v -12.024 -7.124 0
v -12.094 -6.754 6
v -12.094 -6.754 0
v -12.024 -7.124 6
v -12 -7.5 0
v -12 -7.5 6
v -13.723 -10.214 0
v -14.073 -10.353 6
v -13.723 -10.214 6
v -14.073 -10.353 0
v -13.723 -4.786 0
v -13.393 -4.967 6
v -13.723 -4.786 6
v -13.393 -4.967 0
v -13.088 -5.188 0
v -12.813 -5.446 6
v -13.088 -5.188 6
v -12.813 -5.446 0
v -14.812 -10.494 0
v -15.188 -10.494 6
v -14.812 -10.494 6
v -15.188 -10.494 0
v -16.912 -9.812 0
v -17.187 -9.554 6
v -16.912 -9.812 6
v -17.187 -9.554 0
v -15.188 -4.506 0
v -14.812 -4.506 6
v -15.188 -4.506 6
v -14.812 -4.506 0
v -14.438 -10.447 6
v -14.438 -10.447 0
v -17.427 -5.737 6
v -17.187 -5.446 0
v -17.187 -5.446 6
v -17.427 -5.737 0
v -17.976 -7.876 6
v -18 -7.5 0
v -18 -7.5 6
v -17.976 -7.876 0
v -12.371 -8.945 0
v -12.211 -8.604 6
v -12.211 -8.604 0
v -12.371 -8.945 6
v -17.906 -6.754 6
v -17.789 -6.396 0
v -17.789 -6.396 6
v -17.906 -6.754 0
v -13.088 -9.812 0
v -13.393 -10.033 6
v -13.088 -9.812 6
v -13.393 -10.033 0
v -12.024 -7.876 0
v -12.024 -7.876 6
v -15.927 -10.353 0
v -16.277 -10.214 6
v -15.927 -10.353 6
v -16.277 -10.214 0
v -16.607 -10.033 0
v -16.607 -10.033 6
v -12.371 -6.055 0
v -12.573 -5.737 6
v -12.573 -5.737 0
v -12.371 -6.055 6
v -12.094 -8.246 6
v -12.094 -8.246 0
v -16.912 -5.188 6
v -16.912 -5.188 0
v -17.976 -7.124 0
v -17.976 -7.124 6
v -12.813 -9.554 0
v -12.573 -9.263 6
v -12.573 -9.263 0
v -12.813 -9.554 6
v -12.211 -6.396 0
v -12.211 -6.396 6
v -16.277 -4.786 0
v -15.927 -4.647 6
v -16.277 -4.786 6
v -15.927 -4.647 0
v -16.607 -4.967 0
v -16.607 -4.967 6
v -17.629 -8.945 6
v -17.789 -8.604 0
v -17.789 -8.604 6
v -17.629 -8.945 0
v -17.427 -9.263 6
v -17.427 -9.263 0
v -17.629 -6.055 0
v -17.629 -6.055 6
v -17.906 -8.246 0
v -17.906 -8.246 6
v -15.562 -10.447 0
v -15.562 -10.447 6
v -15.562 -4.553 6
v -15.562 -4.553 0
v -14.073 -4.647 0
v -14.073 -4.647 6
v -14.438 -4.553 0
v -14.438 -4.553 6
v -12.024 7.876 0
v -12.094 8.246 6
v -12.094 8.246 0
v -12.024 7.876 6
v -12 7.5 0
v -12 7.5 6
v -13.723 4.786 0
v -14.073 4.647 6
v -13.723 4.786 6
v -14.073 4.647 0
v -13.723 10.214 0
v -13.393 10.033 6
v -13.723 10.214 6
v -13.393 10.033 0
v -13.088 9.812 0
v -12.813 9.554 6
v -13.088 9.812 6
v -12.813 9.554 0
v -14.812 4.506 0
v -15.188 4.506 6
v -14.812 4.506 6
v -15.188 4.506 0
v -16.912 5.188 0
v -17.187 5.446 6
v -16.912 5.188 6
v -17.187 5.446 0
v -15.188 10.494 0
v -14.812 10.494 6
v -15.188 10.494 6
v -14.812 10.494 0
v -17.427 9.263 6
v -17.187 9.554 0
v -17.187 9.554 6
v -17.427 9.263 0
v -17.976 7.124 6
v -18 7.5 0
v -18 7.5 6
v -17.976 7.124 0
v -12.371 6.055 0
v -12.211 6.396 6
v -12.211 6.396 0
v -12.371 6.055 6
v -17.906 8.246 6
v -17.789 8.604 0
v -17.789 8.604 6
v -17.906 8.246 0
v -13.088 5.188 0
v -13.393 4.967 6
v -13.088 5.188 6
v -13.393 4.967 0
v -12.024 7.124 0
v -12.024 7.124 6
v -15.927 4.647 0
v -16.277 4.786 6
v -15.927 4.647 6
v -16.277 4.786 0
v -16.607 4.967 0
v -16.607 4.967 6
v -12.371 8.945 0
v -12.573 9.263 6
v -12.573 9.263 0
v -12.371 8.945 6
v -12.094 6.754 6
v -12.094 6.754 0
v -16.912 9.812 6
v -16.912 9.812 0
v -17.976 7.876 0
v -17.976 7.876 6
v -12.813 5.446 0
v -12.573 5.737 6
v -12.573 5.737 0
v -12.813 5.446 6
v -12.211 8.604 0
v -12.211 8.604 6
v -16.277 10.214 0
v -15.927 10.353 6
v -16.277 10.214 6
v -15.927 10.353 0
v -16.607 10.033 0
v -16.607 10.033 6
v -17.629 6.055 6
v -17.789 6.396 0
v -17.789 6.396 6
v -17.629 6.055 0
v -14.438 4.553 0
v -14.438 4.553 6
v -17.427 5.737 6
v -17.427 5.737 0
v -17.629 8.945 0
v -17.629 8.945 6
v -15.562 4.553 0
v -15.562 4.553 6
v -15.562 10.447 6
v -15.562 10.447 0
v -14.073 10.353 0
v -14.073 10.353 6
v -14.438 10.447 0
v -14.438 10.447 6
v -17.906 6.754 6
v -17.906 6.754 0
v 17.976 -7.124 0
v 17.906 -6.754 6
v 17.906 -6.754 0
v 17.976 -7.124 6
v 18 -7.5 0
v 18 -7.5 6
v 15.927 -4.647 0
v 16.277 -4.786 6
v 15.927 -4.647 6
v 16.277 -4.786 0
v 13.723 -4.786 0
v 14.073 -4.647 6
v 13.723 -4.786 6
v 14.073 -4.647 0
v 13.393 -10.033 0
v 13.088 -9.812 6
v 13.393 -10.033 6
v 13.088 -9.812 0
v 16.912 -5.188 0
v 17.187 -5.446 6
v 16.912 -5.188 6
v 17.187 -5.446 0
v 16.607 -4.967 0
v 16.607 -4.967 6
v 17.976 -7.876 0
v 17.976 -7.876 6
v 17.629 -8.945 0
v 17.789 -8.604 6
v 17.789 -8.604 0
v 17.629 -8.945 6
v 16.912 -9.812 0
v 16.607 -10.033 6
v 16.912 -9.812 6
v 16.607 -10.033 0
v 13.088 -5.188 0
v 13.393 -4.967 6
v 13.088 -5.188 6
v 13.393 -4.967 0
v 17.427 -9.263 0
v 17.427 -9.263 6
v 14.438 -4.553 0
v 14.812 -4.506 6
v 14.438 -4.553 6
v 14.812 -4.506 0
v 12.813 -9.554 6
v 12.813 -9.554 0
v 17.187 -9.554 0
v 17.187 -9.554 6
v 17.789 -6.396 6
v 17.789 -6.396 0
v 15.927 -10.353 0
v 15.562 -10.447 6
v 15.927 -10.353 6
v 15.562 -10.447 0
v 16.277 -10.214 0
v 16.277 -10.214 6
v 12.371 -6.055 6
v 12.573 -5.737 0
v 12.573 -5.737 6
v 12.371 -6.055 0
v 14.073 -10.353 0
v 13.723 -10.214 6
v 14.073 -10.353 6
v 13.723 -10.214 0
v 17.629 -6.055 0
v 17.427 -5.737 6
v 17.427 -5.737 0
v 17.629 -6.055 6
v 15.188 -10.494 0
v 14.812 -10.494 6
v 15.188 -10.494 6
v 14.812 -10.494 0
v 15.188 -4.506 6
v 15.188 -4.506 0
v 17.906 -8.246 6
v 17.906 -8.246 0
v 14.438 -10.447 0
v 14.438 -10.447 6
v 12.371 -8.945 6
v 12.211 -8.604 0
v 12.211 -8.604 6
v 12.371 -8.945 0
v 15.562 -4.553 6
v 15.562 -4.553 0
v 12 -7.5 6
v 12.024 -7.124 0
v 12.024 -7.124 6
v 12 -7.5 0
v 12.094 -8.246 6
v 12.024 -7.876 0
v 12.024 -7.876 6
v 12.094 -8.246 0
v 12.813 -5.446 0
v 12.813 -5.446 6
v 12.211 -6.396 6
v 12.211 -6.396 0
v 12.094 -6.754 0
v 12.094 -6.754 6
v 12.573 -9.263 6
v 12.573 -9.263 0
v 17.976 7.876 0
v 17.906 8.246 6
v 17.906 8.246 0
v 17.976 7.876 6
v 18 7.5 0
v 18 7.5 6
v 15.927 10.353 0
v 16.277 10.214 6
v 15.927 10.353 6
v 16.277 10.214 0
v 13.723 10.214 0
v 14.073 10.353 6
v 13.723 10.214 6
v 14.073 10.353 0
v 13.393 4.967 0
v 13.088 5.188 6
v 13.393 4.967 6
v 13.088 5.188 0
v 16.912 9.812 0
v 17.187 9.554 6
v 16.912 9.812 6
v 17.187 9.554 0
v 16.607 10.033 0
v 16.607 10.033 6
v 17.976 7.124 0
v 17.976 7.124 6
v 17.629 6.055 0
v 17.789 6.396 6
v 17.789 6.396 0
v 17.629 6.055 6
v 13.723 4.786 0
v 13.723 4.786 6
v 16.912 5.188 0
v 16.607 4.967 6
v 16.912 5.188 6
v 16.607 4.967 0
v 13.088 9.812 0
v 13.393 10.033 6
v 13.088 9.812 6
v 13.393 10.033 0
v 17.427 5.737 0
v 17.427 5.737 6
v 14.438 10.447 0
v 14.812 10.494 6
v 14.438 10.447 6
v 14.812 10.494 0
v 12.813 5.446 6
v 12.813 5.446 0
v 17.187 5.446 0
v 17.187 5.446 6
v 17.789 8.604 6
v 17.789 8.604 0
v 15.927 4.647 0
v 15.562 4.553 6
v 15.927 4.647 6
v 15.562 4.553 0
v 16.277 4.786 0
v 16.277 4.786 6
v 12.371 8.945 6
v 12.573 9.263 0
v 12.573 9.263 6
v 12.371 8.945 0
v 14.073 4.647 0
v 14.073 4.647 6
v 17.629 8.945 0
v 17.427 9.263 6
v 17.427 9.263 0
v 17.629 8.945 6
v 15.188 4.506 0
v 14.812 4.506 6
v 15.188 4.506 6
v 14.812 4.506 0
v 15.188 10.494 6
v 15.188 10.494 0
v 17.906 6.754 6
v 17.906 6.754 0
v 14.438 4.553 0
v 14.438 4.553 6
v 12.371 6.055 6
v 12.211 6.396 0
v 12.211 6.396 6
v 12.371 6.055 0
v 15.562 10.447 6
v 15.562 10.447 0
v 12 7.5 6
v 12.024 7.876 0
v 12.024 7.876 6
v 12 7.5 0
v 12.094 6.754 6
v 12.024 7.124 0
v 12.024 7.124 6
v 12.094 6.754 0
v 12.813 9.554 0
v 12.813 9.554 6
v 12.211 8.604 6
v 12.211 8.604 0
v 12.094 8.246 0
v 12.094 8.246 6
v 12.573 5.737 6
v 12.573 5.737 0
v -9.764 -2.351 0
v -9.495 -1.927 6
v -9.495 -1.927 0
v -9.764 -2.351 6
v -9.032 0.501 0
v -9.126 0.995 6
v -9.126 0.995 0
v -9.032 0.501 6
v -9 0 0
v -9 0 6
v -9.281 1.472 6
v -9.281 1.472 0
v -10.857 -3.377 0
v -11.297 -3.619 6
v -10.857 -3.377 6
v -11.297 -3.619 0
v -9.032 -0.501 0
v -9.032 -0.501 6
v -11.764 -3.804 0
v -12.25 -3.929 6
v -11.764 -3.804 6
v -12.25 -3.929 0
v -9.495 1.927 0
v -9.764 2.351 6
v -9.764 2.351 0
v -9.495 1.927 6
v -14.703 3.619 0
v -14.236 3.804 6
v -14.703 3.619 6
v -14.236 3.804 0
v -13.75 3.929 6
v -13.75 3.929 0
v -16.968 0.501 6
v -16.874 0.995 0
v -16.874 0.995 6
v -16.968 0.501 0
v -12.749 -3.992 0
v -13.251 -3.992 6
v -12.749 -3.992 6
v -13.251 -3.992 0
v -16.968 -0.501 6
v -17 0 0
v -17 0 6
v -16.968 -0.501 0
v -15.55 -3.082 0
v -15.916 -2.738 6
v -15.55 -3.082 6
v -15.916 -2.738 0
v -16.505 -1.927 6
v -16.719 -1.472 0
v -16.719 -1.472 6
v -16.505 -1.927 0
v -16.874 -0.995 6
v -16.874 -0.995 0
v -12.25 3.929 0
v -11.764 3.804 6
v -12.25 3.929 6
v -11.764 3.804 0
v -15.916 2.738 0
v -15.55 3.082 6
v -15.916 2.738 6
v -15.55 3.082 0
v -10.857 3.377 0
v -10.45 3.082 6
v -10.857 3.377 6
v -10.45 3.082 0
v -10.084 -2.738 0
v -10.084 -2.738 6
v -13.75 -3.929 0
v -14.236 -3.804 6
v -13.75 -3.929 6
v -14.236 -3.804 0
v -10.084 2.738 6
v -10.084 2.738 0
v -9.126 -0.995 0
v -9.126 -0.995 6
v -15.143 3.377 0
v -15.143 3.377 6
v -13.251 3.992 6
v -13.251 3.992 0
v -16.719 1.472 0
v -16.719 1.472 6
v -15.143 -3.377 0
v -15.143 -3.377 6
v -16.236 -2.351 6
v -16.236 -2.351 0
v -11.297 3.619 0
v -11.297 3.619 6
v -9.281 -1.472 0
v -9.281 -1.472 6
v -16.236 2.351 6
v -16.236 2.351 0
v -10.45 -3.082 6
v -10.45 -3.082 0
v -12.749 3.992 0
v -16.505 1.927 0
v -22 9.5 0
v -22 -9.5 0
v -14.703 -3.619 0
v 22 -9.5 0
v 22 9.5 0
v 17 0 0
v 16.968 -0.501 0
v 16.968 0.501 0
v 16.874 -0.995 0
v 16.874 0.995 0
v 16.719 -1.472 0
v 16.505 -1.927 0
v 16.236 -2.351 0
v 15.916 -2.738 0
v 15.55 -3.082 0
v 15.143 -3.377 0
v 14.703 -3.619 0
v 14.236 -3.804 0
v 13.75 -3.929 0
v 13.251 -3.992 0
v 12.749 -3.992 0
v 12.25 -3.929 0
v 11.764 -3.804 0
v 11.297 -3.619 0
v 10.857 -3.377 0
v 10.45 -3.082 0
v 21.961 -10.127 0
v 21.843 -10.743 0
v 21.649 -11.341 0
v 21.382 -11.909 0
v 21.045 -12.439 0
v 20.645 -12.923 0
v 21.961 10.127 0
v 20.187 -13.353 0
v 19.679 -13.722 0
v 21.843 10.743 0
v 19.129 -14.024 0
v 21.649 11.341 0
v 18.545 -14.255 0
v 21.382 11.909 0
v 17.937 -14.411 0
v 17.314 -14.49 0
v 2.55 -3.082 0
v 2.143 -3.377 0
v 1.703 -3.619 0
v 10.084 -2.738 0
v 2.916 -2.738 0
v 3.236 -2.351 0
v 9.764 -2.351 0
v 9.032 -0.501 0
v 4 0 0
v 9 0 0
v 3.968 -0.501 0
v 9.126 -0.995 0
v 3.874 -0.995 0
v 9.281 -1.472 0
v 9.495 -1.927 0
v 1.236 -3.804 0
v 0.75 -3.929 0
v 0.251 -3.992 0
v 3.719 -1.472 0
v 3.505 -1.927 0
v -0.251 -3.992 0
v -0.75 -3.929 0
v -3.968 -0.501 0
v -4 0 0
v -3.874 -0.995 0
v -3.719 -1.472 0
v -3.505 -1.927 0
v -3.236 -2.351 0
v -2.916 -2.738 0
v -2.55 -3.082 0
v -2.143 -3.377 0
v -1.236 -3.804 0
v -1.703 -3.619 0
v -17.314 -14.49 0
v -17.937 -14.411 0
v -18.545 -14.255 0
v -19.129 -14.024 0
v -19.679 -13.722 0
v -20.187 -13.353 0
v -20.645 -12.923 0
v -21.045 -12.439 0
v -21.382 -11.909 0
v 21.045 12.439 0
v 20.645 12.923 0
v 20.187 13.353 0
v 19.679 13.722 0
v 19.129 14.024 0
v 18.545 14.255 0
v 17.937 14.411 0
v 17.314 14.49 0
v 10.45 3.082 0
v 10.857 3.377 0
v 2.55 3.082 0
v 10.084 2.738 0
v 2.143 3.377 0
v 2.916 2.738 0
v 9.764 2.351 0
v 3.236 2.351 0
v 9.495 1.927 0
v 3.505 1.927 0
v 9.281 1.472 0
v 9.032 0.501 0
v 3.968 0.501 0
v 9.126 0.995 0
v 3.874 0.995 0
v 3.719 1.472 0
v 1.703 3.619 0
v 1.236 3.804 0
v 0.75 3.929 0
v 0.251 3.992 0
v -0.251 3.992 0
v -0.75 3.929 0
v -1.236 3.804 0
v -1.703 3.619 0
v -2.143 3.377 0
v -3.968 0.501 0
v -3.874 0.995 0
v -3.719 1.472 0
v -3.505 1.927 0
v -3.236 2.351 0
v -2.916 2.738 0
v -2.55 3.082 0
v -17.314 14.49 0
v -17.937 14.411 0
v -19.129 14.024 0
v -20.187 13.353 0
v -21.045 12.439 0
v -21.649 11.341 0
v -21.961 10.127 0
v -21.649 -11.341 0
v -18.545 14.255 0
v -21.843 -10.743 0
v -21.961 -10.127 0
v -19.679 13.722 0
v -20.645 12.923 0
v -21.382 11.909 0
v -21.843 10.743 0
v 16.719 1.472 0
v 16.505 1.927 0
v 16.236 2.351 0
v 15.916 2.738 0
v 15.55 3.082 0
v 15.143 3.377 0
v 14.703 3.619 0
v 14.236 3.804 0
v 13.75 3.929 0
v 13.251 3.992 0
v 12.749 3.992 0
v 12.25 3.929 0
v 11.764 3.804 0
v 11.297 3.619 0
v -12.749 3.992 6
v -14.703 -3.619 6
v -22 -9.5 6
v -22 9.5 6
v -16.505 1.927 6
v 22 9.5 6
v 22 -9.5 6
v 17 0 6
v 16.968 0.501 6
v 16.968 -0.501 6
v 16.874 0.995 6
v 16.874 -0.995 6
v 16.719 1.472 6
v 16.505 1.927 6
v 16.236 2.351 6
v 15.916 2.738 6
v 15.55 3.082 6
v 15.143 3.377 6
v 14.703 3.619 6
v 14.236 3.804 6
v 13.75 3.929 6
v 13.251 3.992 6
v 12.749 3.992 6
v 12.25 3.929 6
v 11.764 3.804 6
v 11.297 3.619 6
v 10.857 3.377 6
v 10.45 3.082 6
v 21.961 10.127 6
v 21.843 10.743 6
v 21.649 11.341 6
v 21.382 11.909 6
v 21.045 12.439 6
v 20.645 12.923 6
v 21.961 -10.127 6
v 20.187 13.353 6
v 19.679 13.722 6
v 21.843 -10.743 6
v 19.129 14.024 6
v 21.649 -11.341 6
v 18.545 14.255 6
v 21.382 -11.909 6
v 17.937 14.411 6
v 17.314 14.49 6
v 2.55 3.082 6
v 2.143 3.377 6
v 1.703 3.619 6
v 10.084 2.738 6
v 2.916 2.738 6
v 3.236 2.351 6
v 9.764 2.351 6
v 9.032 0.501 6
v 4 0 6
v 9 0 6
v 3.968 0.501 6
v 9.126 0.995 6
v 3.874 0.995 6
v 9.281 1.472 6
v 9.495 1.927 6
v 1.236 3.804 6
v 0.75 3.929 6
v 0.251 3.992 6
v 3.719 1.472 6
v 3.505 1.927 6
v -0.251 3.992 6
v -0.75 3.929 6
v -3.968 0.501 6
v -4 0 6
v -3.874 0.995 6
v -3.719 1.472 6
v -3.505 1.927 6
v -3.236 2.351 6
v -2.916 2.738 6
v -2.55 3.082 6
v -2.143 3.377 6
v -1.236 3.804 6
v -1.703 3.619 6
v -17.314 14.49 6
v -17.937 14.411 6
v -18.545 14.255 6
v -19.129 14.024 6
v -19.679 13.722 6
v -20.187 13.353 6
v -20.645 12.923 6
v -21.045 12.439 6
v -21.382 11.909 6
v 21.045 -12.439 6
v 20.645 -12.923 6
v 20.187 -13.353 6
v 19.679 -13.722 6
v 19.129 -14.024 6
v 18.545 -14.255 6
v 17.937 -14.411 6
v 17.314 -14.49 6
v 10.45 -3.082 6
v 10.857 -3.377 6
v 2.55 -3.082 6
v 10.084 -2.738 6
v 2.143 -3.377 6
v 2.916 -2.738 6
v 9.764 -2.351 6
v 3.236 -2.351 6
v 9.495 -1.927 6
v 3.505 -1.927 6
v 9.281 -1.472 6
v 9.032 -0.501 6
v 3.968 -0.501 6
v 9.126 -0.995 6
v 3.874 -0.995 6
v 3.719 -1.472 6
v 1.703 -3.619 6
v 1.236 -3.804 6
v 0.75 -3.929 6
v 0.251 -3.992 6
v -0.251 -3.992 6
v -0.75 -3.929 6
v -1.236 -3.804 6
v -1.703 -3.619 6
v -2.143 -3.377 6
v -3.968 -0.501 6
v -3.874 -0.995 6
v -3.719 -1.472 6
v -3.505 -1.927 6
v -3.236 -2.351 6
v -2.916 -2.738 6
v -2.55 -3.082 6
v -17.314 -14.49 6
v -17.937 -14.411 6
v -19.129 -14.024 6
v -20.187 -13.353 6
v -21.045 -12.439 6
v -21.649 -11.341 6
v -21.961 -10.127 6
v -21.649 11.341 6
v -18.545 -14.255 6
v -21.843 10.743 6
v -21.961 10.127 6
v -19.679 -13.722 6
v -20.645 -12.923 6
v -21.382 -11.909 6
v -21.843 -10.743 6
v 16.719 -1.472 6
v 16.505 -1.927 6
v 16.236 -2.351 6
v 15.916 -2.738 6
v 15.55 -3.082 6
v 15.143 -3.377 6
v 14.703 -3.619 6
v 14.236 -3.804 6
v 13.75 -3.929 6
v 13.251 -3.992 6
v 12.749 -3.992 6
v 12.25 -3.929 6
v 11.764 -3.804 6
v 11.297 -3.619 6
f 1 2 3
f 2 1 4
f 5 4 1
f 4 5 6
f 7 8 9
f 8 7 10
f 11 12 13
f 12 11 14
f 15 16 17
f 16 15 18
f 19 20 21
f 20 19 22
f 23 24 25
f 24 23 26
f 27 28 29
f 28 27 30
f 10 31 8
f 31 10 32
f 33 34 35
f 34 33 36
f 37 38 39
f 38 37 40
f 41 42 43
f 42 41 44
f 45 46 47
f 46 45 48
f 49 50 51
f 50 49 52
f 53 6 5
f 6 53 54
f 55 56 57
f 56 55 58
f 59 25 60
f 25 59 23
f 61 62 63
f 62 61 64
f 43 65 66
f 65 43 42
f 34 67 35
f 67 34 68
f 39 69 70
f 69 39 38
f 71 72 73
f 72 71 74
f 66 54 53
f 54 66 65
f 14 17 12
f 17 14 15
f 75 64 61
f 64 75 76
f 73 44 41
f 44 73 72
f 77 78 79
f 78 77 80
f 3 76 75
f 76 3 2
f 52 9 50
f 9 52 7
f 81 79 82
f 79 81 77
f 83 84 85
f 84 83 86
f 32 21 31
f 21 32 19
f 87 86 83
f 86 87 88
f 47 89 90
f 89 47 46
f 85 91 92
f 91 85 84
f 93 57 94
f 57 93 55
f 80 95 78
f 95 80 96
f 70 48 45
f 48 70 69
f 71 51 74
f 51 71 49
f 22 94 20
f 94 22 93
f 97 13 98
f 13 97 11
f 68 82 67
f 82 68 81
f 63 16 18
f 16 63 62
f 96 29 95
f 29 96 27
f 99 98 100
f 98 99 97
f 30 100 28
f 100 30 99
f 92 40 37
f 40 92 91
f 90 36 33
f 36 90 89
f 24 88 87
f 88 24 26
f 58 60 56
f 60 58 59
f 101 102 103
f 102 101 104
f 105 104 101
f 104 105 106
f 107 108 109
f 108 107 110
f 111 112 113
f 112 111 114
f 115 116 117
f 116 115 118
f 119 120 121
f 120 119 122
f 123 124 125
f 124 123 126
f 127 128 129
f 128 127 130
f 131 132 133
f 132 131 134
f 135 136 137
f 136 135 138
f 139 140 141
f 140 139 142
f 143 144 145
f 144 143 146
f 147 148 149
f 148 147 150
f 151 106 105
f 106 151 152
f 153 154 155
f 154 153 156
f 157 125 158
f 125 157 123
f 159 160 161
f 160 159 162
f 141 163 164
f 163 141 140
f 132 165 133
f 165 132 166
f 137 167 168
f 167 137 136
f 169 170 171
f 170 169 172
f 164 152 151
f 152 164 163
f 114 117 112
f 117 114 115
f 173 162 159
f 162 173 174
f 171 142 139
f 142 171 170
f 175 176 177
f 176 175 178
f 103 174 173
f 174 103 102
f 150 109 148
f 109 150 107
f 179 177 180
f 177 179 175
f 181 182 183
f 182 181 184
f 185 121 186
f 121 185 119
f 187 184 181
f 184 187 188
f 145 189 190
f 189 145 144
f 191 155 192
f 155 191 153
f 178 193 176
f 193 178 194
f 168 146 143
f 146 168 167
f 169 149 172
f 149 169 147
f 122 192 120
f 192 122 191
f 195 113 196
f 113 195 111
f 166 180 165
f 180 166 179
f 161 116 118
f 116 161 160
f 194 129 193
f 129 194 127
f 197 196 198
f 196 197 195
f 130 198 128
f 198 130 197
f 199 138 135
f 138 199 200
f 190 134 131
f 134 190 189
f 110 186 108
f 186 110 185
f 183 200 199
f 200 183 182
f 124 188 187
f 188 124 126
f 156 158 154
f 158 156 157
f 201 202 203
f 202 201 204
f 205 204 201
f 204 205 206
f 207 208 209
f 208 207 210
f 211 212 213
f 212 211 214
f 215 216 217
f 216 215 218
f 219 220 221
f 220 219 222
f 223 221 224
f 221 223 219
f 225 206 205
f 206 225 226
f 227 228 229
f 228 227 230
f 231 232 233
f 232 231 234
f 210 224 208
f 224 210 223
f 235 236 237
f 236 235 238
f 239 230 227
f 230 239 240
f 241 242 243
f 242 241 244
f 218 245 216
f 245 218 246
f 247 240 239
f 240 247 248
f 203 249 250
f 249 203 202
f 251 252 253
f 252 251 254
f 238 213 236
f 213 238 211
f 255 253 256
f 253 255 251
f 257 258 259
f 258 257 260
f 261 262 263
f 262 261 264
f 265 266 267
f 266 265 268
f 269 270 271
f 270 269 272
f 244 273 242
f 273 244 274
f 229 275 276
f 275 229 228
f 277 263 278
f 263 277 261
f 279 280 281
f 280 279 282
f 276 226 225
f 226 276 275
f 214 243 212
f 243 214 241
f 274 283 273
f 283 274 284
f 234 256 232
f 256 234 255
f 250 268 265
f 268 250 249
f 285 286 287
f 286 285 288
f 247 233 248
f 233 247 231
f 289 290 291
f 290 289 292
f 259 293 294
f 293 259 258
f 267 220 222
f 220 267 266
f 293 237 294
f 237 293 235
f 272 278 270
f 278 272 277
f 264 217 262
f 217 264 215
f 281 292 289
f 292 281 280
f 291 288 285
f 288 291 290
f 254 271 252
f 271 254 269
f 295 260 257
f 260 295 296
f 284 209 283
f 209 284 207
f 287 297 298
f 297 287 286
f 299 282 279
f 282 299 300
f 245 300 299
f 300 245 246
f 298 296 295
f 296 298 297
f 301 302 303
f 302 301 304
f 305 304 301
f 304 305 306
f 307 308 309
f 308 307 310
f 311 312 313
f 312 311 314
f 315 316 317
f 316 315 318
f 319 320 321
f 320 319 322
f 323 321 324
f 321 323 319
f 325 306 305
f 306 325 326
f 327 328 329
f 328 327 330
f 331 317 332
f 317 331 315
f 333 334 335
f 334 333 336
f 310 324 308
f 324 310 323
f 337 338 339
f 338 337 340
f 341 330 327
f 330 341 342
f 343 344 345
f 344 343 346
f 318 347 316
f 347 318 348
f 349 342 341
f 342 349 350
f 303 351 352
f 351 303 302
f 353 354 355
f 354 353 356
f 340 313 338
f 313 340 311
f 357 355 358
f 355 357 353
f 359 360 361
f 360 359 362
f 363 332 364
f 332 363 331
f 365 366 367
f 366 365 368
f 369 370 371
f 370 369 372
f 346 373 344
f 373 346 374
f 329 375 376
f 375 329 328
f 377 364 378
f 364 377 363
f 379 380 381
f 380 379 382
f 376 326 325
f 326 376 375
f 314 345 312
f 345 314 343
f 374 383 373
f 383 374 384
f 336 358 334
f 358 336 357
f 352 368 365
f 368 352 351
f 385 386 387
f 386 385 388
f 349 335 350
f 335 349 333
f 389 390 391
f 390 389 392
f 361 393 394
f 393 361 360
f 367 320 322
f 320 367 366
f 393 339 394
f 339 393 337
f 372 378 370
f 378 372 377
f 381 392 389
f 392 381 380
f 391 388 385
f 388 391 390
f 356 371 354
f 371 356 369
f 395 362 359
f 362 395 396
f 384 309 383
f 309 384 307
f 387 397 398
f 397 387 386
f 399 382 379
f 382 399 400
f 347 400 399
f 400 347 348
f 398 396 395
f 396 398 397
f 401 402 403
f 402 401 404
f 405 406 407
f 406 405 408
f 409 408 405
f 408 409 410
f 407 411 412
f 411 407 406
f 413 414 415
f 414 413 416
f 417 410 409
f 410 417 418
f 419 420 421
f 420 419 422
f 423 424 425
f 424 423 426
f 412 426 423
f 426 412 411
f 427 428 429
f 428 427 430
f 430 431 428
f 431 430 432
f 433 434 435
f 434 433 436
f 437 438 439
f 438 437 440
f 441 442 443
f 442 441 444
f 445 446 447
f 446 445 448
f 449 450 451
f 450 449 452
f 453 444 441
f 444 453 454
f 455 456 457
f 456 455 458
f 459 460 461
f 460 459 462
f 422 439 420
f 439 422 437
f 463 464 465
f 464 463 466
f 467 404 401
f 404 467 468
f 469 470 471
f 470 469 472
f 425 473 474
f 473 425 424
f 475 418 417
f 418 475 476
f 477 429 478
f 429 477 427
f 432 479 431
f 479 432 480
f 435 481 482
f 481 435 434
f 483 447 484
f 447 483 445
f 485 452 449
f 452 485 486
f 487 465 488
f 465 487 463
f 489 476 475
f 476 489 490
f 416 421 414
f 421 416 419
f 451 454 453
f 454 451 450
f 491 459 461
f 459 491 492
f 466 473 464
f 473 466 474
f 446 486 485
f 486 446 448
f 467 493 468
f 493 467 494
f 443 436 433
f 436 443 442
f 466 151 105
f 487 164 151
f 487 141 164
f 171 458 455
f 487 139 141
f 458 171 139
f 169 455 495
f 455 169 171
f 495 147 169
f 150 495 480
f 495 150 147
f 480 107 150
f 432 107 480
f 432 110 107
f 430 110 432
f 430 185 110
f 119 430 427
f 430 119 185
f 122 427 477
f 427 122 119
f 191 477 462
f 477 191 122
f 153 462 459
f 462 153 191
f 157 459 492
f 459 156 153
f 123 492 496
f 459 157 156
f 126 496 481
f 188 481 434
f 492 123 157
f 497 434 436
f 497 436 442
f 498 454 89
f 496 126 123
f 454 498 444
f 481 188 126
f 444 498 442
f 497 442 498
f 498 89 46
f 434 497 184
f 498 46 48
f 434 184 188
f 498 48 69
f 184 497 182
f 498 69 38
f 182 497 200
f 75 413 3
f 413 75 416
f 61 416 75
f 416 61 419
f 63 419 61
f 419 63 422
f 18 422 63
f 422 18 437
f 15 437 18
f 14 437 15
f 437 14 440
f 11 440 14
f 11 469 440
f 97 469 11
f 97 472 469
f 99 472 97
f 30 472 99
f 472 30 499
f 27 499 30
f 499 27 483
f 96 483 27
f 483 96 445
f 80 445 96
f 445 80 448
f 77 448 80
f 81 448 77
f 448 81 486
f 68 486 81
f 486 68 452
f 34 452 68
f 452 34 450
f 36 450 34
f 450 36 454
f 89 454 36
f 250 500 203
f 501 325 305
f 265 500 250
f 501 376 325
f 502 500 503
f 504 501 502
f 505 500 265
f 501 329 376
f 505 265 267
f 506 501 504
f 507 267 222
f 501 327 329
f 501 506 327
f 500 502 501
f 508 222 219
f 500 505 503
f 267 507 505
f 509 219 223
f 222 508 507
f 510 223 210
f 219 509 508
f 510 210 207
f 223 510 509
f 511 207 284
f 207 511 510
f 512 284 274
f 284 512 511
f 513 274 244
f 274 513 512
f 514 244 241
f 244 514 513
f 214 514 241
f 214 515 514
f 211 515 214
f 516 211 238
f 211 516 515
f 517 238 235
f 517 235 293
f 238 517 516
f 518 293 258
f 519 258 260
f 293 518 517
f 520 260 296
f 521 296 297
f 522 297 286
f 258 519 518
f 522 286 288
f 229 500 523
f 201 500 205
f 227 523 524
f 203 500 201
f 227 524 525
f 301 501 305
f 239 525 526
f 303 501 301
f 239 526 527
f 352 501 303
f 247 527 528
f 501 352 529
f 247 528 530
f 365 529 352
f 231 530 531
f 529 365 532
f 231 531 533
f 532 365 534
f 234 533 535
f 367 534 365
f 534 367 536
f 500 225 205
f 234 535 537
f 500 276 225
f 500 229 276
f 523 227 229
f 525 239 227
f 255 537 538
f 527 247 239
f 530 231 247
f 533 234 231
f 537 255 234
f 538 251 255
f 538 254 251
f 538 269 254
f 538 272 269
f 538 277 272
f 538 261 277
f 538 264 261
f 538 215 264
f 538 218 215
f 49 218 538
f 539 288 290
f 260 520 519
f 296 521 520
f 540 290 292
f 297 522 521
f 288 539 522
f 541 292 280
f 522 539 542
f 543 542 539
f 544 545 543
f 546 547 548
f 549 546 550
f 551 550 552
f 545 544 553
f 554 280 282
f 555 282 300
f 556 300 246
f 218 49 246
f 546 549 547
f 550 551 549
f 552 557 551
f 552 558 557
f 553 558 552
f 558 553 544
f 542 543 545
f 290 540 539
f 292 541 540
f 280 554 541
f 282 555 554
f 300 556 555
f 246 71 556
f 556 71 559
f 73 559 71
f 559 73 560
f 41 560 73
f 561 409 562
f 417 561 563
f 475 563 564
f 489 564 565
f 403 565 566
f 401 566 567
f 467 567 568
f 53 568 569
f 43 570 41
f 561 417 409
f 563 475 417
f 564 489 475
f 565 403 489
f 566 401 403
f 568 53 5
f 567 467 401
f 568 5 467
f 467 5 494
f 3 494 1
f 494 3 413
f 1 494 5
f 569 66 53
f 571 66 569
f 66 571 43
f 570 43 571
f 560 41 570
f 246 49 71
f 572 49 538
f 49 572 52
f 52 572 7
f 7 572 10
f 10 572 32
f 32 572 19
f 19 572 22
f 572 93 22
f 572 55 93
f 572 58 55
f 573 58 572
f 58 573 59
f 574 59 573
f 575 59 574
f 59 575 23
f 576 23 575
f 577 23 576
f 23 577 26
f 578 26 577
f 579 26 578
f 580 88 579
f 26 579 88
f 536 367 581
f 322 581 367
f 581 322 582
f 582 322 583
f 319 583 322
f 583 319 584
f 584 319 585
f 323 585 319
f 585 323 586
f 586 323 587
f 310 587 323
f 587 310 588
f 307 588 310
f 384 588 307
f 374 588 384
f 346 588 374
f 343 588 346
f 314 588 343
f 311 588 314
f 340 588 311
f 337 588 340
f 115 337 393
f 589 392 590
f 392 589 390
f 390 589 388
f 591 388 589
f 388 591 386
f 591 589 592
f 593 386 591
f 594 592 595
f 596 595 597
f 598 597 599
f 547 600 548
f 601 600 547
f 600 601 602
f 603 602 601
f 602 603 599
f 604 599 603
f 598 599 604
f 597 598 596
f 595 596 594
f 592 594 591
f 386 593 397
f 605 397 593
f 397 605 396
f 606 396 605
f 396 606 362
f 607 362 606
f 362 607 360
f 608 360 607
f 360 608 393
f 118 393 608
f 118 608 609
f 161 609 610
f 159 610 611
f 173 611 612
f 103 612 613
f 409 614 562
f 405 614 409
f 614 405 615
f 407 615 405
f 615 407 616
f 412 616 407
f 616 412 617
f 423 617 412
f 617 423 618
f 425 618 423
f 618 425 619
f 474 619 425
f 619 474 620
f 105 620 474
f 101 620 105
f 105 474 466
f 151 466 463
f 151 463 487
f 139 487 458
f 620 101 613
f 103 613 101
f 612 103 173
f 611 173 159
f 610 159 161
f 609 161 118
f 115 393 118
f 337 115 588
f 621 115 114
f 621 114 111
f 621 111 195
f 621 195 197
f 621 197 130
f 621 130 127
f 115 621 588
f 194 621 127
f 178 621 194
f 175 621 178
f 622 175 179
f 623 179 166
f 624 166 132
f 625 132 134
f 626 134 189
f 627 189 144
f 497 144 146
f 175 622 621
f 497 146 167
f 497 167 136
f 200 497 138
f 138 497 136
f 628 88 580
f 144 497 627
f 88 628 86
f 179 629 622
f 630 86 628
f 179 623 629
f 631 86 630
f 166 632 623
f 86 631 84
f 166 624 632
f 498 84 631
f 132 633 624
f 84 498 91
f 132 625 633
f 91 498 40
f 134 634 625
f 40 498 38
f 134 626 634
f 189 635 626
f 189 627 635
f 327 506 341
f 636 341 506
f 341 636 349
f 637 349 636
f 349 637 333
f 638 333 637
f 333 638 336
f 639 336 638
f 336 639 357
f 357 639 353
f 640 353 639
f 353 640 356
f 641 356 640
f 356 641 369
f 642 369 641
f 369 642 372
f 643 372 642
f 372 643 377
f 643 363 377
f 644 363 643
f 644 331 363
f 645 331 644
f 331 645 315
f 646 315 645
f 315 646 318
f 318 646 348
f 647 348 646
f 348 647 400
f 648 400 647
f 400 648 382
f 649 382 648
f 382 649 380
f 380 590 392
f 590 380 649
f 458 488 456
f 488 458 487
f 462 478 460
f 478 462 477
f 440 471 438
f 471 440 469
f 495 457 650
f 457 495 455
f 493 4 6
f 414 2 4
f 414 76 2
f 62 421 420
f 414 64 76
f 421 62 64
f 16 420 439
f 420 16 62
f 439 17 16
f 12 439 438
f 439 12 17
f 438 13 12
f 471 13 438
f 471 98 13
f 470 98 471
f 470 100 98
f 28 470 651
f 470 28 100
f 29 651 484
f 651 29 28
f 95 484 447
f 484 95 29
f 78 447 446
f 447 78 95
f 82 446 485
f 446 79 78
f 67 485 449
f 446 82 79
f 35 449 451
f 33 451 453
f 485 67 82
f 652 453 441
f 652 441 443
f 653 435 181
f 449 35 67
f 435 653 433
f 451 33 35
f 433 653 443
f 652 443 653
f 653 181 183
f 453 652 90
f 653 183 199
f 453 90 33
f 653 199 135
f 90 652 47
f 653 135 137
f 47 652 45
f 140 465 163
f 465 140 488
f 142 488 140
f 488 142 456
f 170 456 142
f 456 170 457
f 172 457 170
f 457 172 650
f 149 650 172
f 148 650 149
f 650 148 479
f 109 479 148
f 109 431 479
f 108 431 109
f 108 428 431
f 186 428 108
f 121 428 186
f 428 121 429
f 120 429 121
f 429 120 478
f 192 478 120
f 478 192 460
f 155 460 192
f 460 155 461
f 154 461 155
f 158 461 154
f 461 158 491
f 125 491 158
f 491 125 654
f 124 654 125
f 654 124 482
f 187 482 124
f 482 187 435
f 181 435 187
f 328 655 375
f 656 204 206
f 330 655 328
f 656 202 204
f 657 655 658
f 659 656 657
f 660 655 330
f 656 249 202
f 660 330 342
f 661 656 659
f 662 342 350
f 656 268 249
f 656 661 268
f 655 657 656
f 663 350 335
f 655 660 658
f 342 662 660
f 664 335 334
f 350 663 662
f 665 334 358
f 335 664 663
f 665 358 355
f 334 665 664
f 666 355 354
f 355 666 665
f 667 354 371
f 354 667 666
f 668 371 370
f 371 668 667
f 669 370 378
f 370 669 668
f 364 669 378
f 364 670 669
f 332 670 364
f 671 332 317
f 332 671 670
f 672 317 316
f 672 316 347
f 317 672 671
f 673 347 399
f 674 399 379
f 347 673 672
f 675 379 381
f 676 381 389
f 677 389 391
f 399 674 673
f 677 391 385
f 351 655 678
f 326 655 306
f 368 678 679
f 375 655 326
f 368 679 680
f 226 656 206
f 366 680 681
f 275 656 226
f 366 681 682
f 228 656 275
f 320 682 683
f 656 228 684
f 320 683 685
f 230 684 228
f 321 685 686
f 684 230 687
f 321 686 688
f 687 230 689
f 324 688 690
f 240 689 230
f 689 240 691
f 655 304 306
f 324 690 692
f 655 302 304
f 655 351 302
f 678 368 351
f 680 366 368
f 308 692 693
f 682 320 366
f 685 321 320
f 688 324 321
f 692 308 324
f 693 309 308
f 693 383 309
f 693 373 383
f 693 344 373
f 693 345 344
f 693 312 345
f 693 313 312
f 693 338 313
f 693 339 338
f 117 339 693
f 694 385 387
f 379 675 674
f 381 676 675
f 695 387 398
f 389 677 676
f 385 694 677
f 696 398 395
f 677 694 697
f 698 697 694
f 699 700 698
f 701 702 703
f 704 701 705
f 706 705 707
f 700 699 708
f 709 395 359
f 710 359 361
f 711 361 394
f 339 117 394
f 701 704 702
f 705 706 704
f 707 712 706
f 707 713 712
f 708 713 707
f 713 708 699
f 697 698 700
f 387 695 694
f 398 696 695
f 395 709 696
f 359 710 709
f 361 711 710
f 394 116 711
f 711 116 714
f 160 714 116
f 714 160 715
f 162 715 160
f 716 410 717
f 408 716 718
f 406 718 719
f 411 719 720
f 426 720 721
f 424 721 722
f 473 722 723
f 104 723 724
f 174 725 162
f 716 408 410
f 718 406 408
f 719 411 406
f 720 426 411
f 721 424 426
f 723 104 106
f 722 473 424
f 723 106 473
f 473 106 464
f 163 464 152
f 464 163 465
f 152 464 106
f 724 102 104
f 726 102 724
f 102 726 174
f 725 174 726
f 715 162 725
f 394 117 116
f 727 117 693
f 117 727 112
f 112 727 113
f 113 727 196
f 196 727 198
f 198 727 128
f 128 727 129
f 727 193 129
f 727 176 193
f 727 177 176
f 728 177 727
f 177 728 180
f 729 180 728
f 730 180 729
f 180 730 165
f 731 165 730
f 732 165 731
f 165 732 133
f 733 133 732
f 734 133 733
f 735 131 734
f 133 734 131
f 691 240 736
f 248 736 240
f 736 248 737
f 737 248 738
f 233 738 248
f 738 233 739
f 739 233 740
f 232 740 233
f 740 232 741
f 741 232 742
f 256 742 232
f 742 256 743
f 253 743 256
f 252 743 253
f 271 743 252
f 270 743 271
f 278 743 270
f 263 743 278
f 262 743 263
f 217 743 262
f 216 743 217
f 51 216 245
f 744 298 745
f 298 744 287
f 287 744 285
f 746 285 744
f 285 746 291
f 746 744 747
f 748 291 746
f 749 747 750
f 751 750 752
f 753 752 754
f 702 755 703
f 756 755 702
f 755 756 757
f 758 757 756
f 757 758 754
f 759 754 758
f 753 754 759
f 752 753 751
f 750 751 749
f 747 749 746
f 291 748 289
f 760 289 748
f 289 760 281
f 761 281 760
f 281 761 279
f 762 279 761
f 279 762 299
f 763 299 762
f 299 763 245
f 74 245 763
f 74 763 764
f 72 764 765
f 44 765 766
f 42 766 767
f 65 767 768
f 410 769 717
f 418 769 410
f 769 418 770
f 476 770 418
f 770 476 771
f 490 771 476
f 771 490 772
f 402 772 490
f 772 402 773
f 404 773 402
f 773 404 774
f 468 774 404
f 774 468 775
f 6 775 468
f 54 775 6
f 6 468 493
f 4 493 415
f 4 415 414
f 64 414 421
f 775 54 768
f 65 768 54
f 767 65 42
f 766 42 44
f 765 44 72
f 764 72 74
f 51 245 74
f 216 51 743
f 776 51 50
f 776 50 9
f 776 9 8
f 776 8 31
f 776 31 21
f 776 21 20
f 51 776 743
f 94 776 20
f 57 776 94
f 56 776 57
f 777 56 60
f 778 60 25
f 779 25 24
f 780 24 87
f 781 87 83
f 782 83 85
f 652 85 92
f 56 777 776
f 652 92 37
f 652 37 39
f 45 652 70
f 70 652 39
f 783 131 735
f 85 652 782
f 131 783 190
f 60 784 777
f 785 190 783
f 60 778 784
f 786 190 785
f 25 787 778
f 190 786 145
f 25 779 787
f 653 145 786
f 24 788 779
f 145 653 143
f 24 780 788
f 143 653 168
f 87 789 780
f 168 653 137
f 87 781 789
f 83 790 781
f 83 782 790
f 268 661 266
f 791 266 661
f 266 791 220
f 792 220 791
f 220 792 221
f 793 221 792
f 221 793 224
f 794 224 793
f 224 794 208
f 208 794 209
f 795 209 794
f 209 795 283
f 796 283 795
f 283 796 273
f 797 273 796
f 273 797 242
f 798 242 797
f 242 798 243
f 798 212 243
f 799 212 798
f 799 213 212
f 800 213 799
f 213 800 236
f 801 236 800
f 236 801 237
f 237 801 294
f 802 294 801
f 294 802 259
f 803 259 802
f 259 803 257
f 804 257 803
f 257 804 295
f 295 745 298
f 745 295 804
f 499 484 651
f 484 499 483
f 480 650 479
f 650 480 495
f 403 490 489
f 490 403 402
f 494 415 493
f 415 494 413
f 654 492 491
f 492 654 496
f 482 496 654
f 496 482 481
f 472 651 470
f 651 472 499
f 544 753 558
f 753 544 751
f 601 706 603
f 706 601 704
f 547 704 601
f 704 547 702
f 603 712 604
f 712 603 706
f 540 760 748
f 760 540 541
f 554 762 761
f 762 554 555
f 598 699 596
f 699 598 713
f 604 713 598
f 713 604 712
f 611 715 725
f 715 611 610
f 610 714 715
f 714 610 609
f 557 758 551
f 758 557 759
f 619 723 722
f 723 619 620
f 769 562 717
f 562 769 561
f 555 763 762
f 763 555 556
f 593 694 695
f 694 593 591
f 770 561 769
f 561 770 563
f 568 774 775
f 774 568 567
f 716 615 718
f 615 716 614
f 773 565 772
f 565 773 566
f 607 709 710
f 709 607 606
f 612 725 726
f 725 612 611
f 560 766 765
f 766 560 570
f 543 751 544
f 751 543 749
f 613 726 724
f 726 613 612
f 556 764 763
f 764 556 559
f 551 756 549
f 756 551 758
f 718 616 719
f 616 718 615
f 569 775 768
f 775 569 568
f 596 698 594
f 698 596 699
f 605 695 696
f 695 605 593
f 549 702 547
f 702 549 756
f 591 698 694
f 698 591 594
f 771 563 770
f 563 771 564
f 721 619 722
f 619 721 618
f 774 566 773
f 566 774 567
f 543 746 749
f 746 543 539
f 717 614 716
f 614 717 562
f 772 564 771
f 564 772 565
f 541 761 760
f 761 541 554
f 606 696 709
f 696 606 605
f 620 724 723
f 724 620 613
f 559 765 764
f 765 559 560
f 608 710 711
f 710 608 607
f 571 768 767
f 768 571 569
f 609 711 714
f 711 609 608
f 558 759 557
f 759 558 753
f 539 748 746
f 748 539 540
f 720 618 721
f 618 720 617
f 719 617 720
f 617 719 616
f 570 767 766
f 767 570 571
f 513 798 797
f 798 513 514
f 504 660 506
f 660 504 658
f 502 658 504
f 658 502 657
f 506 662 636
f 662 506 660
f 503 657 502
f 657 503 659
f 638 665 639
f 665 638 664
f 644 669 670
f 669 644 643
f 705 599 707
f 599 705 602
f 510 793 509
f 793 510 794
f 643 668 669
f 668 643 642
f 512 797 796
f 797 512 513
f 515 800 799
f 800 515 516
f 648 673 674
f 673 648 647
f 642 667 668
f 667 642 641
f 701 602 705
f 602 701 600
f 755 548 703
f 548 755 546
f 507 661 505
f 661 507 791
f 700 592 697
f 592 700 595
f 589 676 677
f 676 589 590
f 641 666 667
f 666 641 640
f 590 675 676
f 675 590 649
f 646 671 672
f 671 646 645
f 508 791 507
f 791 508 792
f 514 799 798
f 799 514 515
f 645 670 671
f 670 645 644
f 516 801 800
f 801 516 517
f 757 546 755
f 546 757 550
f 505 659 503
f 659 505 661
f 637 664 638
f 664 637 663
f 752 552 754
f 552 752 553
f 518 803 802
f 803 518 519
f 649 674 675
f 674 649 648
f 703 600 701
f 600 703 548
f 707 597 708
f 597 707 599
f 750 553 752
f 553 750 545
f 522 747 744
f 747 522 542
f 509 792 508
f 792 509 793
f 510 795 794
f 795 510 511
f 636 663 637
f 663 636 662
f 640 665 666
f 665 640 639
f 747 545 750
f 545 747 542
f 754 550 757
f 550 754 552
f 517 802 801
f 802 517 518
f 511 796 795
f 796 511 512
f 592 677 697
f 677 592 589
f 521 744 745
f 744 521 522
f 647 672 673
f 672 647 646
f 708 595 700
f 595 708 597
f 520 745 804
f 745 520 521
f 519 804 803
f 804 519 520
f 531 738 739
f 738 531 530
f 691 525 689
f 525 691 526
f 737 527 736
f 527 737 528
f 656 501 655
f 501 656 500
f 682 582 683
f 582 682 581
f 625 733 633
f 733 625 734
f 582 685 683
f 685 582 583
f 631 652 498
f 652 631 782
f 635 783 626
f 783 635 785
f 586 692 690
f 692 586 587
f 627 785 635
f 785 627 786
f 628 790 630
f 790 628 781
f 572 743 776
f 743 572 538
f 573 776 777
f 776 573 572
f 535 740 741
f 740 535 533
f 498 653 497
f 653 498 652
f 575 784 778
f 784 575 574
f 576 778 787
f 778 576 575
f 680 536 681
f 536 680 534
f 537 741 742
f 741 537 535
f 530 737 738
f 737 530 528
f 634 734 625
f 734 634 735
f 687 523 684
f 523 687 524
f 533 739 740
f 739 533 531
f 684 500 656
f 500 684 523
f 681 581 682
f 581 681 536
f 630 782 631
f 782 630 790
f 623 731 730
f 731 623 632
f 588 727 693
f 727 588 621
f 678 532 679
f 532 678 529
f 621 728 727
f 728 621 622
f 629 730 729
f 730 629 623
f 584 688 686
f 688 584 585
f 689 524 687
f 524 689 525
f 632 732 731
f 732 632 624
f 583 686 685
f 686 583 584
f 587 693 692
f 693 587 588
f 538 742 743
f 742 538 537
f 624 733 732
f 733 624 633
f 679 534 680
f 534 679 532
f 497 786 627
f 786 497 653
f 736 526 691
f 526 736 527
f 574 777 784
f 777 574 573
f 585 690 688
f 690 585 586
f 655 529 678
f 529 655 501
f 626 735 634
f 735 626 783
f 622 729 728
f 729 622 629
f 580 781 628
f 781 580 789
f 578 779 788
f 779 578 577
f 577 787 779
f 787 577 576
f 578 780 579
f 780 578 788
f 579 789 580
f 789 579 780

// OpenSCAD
$fn = 50;


difference() {
	union() {
		hull() {
			translate(v = [-17.0000000000, 9.5000000000, 0]) {
				cylinder(h = 6, r = 5);
			}
			translate(v = [17.0000000000, 9.5000000000, 0]) {
				cylinder(h = 6, r = 5);
			}
			translate(v = [-17.0000000000, -9.5000000000, 0]) {
				cylinder(h = 6, r = 5);
			}
			translate(v = [17.0000000000, -9.5000000000, 0]) {
				cylinder(h = 6, r = 5);
			}
		}
	}
	union() {
		#translate(v = [-15.0000000000, -7.5000000000, -100.0000000000]) {
			cylinder(h = 200, r = 3.0000000000);
		}
		#translate(v = [-15.0000000000, 7.5000000000, -100.0000000000]) {
			cylinder(h = 200, r = 3.0000000000);
		}
		#translate(v = [15.0000000000, -7.5000000000, -100.0000000000]) {
			cylinder(h = 200, r = 3.0000000000);
		}
		#translate(v = [15.0000000000, 7.5000000000, -100.0000000000]) {
			cylinder(h = 200, r = 3.0000000000);
		}
		#translate(v = [-13.0000000000, 0, 0]) {
			cylinder(h = 6, r = 4.0000000000);
		}
		#cylinder(h = 6, r = 4.0000000000);
		#translate(v = [13.0000000000, 0, 0]) {
			cylinder(h = 6, r = 4.0000000000);
		}
	}
}
